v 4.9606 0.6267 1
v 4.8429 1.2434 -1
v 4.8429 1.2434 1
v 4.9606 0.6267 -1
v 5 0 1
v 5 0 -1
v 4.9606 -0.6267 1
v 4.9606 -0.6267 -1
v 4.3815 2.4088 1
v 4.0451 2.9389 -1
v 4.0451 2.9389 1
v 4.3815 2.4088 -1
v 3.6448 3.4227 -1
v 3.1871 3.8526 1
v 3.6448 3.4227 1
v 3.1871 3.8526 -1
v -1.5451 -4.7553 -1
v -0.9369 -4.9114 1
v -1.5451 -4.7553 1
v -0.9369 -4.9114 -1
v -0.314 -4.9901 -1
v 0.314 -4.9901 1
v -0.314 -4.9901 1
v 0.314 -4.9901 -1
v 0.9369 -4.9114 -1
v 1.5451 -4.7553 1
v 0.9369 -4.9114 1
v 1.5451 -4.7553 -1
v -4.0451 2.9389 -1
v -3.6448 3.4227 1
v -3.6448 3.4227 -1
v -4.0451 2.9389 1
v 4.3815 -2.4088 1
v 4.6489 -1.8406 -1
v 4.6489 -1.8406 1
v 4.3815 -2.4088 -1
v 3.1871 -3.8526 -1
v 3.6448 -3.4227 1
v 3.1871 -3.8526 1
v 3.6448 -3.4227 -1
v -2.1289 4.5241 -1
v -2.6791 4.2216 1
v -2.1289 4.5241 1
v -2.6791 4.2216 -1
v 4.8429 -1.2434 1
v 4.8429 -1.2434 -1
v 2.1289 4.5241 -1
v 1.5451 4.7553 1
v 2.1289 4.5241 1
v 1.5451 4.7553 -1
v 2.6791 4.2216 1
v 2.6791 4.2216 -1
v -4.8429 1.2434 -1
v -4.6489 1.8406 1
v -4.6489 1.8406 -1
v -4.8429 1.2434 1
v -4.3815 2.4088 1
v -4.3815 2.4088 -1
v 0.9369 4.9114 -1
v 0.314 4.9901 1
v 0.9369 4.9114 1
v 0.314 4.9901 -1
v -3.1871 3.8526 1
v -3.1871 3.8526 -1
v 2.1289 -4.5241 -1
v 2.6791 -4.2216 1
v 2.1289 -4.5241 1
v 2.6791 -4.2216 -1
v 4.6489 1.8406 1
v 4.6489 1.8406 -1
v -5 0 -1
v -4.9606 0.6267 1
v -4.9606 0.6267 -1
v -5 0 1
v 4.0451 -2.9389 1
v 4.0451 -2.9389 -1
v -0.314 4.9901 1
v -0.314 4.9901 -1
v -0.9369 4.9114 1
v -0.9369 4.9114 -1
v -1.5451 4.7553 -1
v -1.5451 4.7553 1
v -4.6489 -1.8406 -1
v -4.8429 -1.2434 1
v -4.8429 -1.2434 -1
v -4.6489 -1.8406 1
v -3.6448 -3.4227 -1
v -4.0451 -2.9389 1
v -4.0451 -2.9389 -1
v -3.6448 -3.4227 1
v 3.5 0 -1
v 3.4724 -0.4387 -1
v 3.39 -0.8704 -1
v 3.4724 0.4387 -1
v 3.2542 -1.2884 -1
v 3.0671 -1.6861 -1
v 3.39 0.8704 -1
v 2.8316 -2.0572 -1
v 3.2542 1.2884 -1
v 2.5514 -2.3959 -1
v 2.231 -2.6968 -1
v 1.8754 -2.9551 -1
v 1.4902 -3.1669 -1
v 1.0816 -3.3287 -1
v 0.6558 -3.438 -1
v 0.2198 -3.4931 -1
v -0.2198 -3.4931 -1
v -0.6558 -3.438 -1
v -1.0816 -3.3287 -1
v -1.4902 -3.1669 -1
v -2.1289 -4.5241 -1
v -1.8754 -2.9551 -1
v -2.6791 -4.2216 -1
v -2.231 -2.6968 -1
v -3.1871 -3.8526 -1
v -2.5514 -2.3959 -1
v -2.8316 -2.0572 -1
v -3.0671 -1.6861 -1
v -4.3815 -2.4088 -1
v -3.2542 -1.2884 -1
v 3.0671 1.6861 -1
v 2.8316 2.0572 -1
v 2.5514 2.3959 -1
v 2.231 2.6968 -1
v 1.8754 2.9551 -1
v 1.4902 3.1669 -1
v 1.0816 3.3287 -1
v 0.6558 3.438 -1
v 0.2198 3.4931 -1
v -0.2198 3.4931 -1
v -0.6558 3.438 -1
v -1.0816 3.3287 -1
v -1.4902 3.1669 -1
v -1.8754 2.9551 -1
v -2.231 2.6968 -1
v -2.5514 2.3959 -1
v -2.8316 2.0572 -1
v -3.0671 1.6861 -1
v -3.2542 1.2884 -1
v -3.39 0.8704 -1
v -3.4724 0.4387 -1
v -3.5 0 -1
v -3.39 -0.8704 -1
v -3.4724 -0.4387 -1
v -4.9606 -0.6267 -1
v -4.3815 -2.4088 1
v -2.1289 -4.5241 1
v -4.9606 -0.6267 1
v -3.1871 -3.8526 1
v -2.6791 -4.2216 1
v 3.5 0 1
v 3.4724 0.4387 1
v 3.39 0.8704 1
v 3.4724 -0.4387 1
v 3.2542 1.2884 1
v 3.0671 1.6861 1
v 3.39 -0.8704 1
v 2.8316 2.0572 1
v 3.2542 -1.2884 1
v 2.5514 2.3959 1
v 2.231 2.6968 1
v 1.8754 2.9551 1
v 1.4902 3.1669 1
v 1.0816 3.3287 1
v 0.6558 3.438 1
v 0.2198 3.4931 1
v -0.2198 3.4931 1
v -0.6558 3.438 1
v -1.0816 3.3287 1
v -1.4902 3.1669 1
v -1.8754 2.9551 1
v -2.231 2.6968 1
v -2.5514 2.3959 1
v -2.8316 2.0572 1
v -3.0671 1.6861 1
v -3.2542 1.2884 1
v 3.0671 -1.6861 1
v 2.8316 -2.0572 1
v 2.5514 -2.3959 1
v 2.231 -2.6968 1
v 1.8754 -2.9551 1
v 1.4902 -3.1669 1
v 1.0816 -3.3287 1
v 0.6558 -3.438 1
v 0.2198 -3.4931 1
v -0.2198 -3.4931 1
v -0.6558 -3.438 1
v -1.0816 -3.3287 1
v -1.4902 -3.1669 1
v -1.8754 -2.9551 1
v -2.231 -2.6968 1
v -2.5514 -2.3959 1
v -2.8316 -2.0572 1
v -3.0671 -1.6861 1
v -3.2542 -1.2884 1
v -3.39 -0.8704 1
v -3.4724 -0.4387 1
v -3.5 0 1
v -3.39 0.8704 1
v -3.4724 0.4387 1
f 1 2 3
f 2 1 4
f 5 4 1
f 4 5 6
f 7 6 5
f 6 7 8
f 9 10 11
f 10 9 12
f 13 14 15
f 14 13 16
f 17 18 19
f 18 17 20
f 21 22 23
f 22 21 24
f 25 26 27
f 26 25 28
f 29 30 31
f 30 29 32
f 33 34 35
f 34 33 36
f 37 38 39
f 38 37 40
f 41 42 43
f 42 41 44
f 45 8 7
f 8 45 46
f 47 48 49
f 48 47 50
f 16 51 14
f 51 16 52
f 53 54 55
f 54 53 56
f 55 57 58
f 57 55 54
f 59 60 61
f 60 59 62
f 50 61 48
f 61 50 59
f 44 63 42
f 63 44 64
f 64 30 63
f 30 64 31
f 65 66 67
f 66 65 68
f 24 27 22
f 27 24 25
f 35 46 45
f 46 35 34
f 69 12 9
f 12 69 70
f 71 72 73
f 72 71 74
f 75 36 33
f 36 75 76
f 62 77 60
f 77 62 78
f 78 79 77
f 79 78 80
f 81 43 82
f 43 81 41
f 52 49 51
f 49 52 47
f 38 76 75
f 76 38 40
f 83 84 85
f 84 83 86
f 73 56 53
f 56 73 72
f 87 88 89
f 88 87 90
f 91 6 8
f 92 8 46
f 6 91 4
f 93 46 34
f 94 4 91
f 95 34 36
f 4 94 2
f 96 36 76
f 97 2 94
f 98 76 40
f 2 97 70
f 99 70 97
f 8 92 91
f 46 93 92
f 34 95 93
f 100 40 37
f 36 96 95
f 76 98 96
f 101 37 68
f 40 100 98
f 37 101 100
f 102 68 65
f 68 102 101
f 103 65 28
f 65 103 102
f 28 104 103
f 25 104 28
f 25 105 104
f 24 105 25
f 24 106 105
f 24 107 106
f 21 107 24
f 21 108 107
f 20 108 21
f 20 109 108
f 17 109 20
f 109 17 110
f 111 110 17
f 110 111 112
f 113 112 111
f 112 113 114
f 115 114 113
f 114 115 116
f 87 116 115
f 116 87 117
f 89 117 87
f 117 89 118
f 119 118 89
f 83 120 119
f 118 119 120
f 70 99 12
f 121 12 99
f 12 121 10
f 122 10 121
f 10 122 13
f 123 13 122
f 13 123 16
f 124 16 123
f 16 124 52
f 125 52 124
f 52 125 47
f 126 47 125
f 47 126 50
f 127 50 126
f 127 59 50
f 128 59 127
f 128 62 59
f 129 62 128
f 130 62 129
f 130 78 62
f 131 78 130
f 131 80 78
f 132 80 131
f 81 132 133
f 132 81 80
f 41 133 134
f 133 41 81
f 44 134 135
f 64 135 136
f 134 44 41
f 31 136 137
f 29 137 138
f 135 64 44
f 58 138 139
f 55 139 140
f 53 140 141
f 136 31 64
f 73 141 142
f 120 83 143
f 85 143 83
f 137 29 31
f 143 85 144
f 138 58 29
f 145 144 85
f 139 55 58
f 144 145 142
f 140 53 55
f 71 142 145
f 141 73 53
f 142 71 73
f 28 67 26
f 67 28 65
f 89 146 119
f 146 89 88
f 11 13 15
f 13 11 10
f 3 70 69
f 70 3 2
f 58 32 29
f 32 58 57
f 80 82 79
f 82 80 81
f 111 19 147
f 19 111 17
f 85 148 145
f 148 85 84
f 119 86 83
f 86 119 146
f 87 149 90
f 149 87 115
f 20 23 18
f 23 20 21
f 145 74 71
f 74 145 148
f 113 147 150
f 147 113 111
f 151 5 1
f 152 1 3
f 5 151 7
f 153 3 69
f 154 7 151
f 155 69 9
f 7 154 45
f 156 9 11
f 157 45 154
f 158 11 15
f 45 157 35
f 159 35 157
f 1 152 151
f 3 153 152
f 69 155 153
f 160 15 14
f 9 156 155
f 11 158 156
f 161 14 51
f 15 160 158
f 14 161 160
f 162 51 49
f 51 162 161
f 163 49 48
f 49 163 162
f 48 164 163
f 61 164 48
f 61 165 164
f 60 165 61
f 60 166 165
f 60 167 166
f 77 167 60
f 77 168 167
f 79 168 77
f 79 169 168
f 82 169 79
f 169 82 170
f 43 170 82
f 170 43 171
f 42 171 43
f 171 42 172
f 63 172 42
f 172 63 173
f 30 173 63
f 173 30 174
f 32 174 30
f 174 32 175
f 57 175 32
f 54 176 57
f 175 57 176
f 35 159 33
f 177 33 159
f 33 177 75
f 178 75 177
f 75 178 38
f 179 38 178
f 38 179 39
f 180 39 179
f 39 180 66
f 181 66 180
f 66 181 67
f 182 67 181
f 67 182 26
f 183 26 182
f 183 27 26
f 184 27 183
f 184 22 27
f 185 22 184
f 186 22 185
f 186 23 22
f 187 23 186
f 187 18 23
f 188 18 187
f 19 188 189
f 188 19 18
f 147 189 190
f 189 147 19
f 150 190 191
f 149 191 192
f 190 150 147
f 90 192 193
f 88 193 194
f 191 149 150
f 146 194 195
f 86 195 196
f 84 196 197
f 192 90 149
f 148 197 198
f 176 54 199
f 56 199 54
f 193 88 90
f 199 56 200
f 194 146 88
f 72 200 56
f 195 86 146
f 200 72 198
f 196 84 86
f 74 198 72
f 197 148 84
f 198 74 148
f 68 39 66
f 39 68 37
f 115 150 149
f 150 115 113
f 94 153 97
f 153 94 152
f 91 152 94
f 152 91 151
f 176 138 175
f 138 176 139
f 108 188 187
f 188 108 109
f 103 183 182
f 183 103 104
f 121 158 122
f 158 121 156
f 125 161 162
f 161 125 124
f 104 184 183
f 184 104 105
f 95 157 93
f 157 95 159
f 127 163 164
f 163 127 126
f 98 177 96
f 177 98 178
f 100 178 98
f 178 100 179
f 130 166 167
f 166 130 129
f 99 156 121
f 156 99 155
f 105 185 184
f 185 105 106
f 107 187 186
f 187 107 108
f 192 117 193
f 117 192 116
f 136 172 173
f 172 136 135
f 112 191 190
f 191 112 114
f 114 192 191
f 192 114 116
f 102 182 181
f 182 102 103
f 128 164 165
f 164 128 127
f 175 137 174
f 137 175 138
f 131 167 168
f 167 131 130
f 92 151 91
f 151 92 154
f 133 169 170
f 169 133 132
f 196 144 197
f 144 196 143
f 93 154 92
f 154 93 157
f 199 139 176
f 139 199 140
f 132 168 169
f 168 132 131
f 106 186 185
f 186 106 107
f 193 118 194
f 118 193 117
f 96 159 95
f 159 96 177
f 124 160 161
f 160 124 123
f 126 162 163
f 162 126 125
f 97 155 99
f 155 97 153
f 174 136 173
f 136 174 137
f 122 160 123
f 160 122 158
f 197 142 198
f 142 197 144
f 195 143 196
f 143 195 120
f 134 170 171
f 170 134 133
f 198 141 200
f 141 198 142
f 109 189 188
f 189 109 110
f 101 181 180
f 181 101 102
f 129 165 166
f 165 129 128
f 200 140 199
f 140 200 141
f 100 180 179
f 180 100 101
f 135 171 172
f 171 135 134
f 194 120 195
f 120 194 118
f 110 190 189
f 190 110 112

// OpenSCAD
$fn = 50;


difference() {
	union() {
		translate(v = [0, 0, -1.0000000000]) {
			cylinder(h = 2, r = 5.0000000000);
		}
	}
	union() {
		translate(v = [0, 0, -100.0000000000]) {
			cylinder(h = 200, r = 3.5000000000);
		}
	}
}
